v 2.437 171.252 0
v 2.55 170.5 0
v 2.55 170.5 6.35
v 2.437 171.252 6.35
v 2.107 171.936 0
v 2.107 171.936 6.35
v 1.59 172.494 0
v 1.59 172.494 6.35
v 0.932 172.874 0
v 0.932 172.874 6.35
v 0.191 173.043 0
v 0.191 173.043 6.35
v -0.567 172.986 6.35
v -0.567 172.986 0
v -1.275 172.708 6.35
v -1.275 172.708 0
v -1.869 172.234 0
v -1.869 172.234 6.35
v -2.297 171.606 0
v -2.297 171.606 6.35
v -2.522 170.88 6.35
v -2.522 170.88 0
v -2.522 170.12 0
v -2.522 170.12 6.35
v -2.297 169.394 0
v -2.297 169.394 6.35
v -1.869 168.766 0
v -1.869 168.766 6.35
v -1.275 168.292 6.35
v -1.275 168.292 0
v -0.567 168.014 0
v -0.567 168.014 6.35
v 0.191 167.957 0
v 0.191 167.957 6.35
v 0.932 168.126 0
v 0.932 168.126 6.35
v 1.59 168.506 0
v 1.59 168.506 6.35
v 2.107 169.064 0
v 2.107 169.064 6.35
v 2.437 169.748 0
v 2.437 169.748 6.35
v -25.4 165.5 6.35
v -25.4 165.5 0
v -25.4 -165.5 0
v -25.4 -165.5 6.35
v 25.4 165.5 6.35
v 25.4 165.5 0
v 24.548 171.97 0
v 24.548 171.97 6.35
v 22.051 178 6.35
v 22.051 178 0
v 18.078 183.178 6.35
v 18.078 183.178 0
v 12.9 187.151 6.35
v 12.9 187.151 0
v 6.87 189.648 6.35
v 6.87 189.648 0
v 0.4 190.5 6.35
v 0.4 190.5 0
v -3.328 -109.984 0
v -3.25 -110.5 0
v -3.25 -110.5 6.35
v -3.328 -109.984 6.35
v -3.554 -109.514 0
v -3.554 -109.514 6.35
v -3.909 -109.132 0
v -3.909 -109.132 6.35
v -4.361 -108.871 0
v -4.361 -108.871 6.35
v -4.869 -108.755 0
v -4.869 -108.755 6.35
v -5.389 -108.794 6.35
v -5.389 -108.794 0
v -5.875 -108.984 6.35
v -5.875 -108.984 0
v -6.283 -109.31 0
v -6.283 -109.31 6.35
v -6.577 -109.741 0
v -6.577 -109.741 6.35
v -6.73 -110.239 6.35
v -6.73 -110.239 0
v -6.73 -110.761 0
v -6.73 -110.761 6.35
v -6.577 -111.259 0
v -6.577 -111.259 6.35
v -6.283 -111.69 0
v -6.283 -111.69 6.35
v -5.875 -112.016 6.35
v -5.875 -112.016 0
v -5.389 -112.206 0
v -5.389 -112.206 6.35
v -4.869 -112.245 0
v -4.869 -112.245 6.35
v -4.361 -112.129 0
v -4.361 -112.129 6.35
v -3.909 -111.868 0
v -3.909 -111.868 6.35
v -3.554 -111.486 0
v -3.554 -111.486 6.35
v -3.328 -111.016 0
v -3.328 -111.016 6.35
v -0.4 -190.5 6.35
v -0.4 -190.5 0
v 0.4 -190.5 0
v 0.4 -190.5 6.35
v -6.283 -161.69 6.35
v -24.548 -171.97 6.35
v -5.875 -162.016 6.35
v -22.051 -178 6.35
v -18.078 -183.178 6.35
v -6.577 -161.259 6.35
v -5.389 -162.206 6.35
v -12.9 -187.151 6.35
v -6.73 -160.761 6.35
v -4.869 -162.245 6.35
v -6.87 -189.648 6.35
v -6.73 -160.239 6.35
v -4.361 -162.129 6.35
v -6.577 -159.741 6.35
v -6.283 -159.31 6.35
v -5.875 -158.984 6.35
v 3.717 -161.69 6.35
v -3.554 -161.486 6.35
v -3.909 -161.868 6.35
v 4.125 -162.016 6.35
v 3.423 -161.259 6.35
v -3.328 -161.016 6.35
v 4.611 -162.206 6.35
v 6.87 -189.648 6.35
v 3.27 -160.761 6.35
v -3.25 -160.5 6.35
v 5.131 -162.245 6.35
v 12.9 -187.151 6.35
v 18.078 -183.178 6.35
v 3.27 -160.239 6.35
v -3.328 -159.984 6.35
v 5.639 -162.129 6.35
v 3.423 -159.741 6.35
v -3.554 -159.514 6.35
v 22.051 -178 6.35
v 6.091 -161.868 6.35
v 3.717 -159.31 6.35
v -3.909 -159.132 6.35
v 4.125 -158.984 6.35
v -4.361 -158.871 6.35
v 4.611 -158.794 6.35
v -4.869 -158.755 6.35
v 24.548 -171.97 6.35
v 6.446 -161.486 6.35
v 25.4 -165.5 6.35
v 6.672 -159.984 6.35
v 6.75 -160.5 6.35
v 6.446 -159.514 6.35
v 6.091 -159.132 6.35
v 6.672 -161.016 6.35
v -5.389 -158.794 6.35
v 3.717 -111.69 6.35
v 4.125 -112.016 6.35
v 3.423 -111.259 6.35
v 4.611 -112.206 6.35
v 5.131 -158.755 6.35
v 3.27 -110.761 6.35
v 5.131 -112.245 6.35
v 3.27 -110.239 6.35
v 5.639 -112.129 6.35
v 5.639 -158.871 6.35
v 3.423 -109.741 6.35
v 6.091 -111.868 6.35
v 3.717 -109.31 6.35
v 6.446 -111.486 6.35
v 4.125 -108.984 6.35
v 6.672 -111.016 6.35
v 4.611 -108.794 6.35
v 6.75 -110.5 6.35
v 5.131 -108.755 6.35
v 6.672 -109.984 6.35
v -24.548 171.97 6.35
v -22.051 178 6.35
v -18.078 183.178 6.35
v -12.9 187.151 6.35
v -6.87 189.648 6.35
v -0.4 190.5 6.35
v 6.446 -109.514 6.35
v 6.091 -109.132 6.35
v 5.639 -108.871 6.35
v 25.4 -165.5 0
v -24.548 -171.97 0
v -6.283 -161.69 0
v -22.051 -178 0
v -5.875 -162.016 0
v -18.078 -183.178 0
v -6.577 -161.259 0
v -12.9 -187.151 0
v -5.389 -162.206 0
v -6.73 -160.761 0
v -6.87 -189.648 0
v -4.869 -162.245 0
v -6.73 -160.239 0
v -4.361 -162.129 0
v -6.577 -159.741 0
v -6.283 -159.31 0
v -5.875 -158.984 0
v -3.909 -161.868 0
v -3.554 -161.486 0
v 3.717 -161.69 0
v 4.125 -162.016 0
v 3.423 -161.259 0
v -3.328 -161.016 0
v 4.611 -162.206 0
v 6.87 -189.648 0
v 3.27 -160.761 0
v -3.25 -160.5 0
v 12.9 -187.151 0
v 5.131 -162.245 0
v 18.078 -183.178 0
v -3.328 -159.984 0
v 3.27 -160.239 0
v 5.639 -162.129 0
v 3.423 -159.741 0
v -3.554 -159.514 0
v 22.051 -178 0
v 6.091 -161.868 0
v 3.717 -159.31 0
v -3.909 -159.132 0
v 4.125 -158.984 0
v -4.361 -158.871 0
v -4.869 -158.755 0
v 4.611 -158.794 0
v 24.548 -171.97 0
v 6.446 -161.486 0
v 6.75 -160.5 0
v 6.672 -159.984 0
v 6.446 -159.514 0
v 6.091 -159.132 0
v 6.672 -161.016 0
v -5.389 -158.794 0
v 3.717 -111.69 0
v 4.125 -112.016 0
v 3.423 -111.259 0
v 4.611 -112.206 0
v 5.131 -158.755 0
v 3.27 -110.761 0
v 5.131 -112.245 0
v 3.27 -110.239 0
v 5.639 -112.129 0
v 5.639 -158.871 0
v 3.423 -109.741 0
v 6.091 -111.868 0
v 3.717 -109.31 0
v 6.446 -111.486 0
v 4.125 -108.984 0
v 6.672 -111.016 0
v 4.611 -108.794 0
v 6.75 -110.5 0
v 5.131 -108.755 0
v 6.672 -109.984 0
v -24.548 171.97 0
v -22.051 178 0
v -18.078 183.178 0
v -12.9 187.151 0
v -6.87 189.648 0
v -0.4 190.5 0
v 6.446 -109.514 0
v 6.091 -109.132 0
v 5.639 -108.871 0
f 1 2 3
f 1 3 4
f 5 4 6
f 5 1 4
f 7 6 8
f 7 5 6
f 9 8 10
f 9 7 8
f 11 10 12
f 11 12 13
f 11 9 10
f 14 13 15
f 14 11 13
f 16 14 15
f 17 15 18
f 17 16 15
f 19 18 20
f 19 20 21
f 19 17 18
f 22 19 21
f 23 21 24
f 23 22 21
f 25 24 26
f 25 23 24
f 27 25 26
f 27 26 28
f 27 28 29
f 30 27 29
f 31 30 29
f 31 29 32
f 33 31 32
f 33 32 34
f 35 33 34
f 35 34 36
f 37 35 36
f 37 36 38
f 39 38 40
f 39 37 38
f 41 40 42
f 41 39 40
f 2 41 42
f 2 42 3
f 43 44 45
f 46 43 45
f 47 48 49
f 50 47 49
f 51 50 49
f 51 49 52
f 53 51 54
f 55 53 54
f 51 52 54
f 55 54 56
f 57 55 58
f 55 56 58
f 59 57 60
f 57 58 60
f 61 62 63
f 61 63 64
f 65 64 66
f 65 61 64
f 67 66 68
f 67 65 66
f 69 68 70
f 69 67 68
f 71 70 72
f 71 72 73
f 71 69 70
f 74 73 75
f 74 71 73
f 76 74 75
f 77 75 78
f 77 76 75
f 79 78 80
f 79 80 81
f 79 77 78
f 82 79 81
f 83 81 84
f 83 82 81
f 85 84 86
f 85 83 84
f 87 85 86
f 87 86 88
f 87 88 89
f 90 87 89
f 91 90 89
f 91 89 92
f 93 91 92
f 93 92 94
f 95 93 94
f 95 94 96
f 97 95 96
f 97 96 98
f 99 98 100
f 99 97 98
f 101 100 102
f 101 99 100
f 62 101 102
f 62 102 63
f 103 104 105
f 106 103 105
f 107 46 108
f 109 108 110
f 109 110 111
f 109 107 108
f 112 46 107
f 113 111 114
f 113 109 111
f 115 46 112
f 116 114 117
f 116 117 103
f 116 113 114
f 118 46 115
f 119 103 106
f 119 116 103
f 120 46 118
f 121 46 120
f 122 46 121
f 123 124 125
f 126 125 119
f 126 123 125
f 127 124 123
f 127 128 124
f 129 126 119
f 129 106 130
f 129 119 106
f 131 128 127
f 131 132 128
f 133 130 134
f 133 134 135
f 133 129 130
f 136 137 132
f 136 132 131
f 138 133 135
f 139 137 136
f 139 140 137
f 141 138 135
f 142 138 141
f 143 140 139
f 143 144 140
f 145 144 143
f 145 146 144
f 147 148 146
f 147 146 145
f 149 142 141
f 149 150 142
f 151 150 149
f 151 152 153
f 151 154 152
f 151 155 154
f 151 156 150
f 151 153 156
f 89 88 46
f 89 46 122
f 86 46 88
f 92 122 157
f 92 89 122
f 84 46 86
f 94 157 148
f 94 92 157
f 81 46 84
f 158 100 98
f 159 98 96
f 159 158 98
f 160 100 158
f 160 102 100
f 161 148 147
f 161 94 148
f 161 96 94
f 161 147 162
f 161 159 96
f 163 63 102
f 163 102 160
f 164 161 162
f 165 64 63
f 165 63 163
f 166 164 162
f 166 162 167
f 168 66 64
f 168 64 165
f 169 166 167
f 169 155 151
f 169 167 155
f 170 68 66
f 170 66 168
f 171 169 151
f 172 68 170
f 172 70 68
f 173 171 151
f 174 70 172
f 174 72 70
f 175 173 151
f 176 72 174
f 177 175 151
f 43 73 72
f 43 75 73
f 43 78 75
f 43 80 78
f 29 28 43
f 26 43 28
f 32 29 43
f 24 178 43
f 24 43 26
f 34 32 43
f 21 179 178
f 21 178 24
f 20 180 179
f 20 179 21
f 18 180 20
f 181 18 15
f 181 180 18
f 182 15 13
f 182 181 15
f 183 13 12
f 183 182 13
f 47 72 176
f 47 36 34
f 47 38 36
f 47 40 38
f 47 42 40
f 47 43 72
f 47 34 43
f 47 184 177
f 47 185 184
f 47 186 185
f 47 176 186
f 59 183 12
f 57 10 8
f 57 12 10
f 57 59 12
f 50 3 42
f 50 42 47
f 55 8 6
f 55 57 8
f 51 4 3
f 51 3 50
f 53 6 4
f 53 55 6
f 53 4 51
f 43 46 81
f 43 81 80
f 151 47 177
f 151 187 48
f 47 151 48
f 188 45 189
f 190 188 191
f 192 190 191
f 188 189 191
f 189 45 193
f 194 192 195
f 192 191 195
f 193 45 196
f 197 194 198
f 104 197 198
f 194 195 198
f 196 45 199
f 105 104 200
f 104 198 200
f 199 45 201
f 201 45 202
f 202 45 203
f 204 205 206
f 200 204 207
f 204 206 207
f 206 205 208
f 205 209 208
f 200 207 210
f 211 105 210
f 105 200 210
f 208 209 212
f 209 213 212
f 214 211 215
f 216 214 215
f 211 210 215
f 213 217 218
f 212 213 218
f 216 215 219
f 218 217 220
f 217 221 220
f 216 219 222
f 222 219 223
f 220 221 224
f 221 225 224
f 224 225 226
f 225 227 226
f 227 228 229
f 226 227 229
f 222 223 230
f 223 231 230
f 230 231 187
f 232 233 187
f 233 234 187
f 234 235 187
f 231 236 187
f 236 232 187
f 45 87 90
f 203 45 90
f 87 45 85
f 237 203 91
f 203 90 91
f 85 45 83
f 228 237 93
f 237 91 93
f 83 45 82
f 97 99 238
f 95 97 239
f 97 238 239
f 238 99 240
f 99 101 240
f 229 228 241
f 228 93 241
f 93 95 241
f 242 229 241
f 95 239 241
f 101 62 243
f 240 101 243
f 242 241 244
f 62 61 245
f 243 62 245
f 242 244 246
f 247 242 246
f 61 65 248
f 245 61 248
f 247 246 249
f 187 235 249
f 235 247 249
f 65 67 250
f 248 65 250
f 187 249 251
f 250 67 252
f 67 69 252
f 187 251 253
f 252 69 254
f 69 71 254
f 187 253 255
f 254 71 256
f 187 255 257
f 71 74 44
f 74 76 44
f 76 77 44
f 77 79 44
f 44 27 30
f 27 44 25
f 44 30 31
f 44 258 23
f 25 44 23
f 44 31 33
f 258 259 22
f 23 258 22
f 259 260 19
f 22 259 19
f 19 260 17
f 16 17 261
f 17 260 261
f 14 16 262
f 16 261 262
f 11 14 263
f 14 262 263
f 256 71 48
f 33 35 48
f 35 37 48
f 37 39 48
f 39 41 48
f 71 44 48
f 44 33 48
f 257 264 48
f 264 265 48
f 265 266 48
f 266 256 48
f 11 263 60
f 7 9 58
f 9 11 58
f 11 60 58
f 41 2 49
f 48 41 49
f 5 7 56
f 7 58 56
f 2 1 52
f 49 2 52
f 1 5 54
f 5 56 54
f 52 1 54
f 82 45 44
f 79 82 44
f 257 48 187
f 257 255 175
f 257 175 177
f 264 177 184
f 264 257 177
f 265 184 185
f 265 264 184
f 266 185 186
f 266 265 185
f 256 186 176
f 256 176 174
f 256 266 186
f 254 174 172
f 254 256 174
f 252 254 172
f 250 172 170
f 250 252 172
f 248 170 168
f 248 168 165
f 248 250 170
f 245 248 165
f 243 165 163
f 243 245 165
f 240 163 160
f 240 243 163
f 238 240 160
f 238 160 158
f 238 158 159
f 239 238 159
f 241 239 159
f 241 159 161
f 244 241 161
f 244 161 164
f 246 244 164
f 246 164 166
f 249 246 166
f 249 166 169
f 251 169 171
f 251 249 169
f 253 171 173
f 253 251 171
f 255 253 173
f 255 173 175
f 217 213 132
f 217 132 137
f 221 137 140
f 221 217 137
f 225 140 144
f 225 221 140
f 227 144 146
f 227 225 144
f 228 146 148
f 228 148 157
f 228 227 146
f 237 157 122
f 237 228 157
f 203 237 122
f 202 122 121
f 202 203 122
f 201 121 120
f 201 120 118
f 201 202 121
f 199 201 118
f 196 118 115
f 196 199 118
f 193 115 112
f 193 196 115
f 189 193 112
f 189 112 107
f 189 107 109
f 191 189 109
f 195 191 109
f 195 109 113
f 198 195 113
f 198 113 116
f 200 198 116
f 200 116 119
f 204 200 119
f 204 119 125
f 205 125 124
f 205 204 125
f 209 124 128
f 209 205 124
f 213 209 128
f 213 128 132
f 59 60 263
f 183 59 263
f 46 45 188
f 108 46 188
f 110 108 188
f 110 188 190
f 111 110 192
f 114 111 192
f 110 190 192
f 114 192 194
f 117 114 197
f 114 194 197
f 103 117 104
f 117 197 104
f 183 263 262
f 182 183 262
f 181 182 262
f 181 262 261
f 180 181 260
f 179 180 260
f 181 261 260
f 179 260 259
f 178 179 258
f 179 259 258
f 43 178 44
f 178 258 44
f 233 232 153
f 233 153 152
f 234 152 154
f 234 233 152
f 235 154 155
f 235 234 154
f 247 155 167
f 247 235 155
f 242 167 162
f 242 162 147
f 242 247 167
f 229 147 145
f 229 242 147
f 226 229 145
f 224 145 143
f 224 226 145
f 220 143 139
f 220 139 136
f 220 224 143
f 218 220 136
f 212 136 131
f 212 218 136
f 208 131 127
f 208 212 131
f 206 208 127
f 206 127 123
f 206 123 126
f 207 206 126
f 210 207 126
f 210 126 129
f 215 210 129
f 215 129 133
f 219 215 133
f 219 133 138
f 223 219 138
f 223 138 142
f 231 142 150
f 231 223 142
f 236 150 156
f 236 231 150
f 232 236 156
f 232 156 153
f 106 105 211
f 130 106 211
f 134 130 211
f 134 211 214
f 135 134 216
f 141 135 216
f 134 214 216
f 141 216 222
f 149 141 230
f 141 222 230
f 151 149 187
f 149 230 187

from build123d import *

# Parameters (mm, degrees)
F0_R     = 1.75
F0_R_2   = 2.55
F1_DEPTH = 6.35


with BuildPart() as f1:
    # F0 (on Top) → F1 (new body)
    with BuildSketch(Plane.XY):
        with BuildLine():
            ThreePointArc((25.4, 165.5), (18.07767, 183.17767), (0.4, 190.5))
            Line((0.4, 190.5), (-0.4, 190.5))
            ThreePointArc((-0.4, 190.5), (-18.07767, 183.17767), (-25.4, 165.5))
            Line((-25.4, 165.5), (-25.4, -165.5))
            ThreePointArc((-25.4, -165.5), (-18.07767, -183.17767), (-0.4, -190.5))
            Line((-0.4, -190.5), (0.4, -190.5))
            ThreePointArc((0.4, -190.5), (18.07767, -183.17767), (25.4, -165.5))
            Line((25.4, -165.5), (25.4, 165.5))
        make_face()
        with Locations((-5, -160.5)):
            Circle(F0_R, mode=Mode.SUBTRACT)
        with Locations((-5, -110.5)):
            Circle(F0_R, mode=Mode.SUBTRACT)
        with Locations((5, -160.5)):
            Circle(F0_R, mode=Mode.SUBTRACT)
        with Locations((5, -110.5)):
            Circle(F0_R, mode=Mode.SUBTRACT)
        with Locations((0, 170.5)):
            Circle(F0_R_2, mode=Mode.SUBTRACT)
    extrude(amount=F1_DEPTH)


solid = f1.part
